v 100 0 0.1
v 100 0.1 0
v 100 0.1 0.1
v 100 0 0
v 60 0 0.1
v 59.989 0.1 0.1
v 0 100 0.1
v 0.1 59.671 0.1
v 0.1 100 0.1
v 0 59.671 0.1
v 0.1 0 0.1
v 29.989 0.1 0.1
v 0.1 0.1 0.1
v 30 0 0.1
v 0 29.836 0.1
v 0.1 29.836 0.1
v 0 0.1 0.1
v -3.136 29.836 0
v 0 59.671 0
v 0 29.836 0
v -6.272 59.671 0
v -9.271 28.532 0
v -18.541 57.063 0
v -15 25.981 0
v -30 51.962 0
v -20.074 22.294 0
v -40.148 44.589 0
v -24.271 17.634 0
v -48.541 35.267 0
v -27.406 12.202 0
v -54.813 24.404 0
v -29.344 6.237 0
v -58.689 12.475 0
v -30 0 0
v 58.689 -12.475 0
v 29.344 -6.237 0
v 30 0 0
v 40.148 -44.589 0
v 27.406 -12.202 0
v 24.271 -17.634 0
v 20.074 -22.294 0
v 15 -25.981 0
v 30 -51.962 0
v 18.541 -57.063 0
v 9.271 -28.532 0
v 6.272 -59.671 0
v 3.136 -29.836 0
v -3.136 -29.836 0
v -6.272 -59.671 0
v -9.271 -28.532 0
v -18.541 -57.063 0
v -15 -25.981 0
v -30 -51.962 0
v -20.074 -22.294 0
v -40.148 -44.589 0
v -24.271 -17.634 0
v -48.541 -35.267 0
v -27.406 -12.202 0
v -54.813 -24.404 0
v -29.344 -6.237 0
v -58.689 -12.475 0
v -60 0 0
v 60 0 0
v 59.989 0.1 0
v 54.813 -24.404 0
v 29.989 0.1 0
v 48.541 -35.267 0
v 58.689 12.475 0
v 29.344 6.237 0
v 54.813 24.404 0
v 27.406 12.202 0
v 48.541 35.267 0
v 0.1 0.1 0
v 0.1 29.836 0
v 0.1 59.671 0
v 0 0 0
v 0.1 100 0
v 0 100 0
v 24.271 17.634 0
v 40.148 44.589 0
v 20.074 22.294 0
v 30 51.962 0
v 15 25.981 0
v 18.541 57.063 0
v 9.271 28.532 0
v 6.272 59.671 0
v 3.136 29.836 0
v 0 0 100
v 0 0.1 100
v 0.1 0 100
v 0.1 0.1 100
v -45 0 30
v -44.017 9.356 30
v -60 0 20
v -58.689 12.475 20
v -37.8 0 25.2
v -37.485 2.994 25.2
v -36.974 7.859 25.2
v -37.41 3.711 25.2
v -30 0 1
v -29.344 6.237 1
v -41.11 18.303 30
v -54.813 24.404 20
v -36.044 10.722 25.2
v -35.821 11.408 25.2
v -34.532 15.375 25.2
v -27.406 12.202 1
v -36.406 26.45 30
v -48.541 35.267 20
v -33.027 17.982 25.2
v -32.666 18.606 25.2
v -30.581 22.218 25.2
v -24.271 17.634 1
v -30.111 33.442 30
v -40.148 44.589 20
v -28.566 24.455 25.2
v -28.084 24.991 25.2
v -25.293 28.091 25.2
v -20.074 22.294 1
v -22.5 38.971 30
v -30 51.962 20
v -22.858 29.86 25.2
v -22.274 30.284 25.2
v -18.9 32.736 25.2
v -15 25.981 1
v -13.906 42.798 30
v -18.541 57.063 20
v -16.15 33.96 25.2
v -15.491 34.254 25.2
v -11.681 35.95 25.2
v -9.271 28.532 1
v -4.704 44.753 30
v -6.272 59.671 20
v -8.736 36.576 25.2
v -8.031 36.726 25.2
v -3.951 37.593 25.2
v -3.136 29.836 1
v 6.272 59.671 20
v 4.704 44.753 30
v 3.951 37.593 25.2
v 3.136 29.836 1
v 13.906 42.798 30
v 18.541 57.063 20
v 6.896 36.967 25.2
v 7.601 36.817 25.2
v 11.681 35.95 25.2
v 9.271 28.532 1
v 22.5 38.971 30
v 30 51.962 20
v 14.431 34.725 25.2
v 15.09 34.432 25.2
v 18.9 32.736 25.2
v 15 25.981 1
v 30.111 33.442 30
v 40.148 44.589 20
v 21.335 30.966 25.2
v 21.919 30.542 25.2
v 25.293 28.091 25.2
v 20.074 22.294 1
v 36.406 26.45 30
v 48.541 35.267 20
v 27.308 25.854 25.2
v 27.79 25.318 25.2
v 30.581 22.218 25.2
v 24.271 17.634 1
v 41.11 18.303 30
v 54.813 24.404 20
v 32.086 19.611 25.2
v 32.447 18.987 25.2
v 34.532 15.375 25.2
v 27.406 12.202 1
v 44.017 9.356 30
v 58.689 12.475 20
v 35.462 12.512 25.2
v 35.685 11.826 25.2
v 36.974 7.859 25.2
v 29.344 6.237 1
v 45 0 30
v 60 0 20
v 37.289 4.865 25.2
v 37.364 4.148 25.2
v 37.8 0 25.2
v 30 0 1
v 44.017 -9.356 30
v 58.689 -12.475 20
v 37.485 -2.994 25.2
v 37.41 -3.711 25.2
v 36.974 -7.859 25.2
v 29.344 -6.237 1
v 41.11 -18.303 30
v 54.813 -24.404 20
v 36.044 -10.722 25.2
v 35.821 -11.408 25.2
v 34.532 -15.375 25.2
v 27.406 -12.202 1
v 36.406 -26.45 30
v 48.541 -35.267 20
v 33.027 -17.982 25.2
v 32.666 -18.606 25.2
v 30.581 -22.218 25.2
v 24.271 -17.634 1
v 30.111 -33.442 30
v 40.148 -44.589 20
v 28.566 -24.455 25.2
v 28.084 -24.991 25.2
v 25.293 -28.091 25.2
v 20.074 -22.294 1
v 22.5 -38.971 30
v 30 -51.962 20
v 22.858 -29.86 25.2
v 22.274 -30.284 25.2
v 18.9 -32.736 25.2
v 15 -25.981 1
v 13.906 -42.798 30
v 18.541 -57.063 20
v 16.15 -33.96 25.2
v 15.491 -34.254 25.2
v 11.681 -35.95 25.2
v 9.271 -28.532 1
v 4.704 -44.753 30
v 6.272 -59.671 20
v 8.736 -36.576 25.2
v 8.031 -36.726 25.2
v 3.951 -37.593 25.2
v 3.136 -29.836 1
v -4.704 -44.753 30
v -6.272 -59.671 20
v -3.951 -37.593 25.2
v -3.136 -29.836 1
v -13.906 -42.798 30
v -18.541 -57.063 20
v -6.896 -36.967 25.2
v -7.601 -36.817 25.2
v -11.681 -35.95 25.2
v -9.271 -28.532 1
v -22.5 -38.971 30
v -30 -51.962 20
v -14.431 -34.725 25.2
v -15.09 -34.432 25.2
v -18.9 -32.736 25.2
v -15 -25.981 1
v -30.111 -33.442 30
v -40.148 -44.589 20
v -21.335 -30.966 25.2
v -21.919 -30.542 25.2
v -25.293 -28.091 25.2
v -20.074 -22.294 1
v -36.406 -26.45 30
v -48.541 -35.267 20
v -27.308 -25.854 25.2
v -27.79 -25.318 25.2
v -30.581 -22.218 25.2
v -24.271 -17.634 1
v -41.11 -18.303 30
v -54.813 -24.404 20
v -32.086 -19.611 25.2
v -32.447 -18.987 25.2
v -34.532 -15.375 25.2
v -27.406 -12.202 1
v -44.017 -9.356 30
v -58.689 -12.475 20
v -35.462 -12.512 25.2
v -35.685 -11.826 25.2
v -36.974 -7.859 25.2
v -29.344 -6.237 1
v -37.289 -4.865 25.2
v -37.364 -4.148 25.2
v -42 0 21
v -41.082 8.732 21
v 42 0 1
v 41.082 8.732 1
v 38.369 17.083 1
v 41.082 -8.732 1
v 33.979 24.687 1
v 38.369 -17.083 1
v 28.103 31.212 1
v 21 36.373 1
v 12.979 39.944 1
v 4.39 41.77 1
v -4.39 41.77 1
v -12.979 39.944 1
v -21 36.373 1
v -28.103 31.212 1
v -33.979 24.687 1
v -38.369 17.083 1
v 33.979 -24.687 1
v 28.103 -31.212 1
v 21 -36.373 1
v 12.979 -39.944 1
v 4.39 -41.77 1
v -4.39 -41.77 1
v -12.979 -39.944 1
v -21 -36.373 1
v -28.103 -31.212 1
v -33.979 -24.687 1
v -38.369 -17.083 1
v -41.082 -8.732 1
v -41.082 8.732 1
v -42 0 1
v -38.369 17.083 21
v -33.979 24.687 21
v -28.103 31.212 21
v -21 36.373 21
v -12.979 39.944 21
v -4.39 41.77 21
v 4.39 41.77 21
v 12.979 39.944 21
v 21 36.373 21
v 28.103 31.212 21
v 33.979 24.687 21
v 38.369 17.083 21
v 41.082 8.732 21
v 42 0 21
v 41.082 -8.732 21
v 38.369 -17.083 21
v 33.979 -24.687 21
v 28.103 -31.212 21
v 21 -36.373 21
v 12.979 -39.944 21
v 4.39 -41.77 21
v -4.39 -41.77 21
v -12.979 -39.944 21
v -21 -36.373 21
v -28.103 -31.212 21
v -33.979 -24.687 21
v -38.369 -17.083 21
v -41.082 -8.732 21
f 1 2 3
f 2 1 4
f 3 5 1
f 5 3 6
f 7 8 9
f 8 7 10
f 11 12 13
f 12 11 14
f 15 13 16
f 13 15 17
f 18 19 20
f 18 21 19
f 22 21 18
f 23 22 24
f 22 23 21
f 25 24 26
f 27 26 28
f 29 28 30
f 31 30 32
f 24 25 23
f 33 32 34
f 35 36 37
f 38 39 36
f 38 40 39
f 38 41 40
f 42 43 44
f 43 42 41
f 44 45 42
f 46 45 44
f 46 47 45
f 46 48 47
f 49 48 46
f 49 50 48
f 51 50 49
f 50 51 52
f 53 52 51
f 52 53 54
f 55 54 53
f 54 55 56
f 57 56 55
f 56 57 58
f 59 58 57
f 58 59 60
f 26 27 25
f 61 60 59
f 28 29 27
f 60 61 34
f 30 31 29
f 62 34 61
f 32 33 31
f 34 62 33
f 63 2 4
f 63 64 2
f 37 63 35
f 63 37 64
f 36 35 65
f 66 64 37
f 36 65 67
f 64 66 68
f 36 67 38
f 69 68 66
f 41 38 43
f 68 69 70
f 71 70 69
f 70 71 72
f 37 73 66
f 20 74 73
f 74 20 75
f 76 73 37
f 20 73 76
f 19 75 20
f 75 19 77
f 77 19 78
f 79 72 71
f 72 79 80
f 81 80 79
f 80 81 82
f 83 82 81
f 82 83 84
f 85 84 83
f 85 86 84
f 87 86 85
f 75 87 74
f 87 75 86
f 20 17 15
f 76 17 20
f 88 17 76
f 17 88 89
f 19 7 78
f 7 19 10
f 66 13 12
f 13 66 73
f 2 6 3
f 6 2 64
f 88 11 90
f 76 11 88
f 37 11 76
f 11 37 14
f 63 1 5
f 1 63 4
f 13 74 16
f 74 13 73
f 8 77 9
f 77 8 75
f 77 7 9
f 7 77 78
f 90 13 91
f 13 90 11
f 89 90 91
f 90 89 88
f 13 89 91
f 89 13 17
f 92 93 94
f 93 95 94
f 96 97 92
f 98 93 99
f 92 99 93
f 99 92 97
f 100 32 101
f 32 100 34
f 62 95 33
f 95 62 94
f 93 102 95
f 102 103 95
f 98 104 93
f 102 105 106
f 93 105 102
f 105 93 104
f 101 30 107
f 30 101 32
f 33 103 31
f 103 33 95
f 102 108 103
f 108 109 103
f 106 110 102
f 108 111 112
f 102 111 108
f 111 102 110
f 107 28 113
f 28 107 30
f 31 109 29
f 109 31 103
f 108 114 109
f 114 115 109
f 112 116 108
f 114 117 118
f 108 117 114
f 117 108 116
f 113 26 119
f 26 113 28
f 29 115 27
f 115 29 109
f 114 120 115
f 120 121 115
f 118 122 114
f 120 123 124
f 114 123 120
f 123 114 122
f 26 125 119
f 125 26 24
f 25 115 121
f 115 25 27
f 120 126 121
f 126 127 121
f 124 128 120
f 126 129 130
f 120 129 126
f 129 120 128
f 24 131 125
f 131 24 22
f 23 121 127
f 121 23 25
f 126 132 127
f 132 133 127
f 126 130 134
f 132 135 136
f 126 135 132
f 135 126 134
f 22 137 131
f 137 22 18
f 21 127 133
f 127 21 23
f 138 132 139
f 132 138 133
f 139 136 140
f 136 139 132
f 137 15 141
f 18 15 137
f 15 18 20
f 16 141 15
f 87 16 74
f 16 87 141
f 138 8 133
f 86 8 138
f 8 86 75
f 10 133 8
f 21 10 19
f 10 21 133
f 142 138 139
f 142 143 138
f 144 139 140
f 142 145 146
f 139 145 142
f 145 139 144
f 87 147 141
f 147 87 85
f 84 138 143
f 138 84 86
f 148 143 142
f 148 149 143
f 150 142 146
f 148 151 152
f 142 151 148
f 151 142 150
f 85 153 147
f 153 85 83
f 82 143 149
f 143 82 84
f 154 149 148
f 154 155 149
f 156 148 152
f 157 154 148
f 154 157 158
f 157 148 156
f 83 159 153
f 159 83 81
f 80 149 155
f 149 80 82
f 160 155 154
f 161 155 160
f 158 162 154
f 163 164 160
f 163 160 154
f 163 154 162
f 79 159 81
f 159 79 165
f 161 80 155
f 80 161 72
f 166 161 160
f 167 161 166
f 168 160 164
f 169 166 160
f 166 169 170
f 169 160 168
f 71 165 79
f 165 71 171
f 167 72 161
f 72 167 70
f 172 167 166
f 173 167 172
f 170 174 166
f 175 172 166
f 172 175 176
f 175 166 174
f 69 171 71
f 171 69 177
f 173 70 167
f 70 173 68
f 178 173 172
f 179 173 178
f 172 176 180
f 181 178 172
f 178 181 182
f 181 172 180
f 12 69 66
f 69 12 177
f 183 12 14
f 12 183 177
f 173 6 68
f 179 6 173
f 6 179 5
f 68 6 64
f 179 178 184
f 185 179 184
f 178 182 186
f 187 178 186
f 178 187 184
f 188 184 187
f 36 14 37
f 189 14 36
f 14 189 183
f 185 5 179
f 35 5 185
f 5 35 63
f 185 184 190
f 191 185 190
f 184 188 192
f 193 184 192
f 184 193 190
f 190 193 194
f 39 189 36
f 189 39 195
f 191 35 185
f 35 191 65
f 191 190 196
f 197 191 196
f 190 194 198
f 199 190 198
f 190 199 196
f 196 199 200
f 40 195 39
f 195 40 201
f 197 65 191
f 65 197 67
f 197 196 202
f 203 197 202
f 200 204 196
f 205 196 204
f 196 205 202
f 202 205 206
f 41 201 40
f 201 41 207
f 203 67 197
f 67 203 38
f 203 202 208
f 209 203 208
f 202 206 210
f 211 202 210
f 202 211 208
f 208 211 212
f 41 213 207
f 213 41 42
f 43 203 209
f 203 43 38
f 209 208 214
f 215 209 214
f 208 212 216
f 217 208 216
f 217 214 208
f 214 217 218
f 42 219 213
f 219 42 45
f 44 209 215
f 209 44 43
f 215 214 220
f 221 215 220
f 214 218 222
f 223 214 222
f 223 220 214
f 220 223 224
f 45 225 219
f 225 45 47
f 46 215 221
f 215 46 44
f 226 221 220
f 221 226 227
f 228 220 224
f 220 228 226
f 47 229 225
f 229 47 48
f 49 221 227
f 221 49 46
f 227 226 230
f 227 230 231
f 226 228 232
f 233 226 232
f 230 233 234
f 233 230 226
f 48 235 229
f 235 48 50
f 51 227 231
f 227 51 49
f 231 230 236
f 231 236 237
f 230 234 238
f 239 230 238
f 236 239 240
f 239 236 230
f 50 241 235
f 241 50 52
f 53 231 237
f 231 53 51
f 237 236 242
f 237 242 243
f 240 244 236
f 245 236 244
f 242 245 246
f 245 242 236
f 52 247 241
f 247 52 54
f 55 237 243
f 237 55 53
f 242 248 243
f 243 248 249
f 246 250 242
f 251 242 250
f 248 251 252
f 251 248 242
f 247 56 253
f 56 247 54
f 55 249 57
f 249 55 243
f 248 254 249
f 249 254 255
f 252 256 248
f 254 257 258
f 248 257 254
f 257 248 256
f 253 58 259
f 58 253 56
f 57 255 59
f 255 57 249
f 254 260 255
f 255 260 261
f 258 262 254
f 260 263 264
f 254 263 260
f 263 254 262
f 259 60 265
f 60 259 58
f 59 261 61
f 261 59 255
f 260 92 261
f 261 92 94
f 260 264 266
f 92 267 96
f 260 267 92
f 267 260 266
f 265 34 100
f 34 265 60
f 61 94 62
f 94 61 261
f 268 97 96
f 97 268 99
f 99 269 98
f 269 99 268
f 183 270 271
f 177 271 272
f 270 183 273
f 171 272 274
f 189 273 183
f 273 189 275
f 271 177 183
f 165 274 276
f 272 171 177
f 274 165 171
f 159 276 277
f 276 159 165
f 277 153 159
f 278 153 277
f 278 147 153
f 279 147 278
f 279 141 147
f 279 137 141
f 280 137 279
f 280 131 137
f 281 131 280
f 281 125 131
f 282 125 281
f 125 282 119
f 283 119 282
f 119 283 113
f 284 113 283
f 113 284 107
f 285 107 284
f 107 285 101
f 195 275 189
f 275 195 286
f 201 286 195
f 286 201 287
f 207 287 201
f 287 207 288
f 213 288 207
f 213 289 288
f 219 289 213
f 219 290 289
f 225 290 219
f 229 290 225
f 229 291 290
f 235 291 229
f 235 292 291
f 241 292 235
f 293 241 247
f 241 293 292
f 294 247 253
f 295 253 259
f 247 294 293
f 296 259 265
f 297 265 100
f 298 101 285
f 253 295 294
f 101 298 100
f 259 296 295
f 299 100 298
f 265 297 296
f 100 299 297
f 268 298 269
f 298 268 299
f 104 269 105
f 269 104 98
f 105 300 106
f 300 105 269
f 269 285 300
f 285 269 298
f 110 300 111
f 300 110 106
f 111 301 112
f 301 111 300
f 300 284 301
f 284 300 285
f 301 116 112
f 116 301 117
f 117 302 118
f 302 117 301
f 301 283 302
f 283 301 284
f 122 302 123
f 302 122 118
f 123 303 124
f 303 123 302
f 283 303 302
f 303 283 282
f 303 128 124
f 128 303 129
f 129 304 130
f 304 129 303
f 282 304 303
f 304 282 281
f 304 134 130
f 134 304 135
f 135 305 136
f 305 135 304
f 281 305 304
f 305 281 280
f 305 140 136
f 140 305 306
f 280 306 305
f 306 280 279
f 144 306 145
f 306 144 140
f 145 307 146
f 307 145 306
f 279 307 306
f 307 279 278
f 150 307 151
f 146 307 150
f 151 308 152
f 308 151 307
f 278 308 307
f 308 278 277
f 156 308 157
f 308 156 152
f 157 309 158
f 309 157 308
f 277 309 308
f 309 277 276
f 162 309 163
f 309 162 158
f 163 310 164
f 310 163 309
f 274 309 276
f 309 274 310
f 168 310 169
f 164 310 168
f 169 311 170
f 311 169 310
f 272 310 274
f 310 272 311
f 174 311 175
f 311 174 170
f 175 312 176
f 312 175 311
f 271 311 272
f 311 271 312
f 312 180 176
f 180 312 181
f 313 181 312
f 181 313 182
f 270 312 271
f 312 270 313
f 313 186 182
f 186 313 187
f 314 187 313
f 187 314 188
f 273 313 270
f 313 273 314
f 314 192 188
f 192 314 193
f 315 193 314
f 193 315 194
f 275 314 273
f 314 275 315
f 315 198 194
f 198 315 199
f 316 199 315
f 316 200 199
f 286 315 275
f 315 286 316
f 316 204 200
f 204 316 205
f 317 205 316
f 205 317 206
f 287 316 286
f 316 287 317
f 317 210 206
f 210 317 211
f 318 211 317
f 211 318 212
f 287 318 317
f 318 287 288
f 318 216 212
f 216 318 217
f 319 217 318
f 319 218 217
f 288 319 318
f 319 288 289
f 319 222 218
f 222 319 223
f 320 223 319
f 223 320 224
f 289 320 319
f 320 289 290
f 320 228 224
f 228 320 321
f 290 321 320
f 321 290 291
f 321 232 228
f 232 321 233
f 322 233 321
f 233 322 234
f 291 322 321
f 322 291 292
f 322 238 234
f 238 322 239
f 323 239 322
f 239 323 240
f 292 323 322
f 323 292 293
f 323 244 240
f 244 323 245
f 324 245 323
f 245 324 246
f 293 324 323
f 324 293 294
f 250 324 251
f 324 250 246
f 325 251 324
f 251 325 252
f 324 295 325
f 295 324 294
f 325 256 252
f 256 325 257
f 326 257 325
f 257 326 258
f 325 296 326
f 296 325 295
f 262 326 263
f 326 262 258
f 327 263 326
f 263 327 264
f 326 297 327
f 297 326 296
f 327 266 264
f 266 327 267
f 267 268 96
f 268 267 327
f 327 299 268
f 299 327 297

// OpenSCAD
    // Combined Scene

    // Permanent Model
    
    // Permanent Model (Black)
    color([0, 0, 0]) {
        // Your permanent model code here
        cube([100,0.1,0.1], center = false);
        cube([0.1,100,0.1], center = false);
        cube([0.1,0.1,100], center = false);
    }
    

    // Dynamic Model
    difference() {
    // Create the outer flared shape of the lampshade
    difference() {
        rotate_extrude(angle = 360) 
            translate([30, 0, 0]) 
                polygon(points=[[0, 0], [0, 20], [15, 30], [30, 20], [30, 0]]);
        translate([0, 0, 1]) 
            rotate_extrude(angle = 360) 
                translate([22, 0, 0]) 
                    polygon(points=[[0, 0], [0, 20], [12, 28], [20, 20], [20, 0]]);
    }
    
    // Create the base hole for the light bulb fitting
    translate([0, 0, -1])
        cylinder(h = 5, r = 10, center = true);
}
    
